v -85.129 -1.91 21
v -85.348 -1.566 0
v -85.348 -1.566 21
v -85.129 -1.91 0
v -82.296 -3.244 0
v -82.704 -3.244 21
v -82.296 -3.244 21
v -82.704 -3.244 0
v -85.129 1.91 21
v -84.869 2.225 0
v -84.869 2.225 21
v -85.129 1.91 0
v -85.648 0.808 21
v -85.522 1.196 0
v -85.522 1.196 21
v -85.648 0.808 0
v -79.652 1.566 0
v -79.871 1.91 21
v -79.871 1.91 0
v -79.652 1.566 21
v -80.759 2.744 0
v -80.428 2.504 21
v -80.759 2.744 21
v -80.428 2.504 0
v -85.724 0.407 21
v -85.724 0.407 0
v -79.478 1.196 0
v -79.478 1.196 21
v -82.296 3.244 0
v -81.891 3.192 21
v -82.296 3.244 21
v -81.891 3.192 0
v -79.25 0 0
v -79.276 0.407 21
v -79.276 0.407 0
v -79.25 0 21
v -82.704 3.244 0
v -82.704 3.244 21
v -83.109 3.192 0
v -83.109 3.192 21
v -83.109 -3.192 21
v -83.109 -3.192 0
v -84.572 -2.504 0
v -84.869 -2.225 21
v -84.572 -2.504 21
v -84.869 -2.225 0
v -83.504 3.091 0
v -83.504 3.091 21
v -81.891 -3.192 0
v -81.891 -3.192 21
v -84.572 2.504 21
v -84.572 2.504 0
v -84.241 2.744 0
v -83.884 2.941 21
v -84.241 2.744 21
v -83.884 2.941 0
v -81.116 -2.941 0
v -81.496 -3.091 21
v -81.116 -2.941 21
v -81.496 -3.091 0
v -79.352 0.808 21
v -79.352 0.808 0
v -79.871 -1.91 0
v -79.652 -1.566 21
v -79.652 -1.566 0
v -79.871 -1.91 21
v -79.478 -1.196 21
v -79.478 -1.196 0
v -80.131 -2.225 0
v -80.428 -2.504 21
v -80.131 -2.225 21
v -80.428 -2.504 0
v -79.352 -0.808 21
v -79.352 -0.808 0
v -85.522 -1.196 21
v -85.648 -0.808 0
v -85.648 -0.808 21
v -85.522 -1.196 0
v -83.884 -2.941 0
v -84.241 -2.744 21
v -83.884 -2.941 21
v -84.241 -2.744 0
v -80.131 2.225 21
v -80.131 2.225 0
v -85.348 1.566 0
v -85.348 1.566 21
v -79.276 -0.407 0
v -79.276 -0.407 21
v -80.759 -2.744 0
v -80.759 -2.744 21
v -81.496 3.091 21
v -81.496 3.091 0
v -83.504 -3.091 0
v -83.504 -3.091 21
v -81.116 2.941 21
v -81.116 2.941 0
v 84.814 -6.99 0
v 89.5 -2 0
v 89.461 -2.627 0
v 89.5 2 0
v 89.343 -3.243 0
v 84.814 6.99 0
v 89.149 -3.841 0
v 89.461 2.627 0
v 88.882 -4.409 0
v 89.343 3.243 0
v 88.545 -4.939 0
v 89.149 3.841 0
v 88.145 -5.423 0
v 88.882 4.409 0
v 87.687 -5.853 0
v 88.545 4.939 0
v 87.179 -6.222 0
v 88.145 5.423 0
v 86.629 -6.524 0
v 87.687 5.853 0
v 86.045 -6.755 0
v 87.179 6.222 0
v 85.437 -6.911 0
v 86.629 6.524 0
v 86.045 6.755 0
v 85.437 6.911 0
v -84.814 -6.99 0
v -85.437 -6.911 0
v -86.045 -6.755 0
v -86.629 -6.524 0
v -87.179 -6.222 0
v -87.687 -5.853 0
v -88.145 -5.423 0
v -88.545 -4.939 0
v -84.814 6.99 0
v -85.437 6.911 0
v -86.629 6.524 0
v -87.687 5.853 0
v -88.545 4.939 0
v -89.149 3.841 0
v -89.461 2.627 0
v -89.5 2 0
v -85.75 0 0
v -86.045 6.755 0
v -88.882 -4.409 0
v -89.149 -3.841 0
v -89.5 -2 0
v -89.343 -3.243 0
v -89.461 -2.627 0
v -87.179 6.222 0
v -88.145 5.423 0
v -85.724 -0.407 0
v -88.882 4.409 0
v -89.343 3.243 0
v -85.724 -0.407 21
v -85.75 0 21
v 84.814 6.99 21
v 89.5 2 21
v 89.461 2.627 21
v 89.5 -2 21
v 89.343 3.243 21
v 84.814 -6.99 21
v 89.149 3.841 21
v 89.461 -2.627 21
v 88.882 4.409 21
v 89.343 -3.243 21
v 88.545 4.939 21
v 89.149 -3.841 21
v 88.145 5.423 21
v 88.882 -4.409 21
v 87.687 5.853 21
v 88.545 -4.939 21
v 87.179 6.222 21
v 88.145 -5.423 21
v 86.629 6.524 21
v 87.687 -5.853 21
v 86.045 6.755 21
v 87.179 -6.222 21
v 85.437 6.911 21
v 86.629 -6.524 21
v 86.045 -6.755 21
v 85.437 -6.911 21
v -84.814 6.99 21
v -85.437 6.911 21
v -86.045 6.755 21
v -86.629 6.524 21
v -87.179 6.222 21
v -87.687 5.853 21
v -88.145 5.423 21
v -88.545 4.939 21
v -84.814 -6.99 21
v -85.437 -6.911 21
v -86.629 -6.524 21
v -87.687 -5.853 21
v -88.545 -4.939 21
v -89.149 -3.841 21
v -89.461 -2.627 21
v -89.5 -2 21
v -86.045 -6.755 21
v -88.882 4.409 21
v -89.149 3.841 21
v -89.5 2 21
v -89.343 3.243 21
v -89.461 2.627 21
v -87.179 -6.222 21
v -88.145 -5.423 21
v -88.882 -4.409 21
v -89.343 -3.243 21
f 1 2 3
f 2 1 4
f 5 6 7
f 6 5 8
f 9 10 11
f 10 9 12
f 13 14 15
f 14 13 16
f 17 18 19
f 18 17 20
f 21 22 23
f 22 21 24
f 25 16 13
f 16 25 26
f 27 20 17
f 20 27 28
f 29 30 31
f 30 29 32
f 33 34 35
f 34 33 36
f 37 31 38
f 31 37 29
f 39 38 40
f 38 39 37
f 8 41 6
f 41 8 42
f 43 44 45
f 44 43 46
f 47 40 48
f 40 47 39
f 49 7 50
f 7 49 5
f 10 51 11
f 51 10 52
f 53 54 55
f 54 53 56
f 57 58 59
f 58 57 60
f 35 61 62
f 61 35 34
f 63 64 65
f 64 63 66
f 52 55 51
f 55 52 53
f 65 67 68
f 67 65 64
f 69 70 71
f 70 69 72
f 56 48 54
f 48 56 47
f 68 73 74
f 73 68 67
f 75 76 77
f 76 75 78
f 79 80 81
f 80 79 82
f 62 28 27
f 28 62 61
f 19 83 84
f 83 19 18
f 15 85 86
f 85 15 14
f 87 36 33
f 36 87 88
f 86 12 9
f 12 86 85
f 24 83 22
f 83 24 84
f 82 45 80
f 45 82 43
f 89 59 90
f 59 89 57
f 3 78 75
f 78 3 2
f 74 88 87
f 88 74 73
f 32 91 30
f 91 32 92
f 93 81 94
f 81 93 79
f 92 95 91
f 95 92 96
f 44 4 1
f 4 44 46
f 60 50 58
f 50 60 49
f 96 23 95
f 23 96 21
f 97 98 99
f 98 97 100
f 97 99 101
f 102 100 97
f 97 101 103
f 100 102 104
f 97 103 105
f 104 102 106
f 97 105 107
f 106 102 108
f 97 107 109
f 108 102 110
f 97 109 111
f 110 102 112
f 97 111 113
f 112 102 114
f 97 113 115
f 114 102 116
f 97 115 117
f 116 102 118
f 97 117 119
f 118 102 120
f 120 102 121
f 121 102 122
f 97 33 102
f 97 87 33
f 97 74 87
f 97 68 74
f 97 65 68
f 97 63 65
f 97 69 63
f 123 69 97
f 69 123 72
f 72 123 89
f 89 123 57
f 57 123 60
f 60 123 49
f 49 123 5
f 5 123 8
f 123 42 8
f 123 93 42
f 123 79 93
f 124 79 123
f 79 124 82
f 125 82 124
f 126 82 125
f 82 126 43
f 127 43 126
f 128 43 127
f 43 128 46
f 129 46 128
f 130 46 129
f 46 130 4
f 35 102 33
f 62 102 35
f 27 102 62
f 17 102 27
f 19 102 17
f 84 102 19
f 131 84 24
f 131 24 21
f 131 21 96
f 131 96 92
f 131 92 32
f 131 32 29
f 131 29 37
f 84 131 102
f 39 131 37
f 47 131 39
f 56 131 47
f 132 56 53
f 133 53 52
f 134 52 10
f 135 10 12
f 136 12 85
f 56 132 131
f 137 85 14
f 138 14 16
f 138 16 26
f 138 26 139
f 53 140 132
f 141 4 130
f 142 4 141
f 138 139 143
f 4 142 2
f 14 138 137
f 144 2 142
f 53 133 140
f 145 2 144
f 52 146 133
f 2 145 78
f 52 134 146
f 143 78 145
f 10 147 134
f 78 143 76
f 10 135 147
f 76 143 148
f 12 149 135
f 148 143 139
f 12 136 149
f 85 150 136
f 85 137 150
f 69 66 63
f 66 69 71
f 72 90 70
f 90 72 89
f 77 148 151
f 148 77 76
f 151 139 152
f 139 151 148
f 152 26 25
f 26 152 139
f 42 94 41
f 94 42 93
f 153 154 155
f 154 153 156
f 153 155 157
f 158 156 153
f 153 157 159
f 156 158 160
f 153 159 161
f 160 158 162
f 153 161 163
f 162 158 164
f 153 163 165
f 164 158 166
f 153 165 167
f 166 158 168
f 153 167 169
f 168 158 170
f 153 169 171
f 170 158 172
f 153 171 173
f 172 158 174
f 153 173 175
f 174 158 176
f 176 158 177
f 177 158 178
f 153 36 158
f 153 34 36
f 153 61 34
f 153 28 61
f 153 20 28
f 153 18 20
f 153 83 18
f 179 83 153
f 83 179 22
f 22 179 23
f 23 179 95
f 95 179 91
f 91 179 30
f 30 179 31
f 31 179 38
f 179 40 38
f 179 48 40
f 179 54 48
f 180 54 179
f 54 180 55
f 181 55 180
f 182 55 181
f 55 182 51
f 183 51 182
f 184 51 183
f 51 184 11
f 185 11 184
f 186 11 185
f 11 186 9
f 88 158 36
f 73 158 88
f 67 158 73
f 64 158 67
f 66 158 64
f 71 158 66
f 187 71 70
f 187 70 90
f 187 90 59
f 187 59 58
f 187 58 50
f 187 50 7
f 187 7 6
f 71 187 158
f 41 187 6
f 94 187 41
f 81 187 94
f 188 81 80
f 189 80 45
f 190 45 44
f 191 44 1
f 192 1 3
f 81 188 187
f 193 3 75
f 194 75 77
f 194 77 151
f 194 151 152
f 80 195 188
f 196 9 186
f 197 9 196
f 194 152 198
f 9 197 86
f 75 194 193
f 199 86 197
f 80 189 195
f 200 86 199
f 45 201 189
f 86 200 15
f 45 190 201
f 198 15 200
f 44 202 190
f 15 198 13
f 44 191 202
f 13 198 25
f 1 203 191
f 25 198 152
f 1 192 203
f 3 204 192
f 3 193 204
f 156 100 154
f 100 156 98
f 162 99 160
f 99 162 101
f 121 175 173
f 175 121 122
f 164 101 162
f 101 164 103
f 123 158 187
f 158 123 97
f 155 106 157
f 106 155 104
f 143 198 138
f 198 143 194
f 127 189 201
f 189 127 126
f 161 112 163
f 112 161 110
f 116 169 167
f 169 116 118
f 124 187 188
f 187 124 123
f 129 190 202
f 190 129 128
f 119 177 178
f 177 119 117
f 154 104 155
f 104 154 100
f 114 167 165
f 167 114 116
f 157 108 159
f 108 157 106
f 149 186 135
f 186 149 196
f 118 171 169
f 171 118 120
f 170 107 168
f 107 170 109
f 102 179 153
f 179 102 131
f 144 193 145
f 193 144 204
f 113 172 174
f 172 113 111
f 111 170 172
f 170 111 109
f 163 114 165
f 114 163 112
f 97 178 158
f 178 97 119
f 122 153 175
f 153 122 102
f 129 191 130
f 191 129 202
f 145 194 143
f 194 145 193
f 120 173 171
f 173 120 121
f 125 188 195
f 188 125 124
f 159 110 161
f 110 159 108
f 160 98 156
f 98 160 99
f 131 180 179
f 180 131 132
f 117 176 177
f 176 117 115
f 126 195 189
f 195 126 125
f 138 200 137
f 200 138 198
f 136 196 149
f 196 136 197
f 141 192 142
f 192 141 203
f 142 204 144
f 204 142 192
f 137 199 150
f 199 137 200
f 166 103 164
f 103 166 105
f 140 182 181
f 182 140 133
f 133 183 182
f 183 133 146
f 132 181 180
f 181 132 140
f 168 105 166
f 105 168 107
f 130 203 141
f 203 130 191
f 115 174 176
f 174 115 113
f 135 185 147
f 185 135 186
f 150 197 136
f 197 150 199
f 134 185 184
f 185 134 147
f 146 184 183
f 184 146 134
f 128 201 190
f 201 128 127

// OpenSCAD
$fn = 50;


difference() {
	union() {
		hull() {
			translate(v = [-84.5000000000, 2.0000000000, 0]) {
				cylinder(h = 21, r = 5);
			}
			translate(v = [84.5000000000, 2.0000000000, 0]) {
				cylinder(h = 21, r = 5);
			}
			translate(v = [-84.5000000000, -2.0000000000, 0]) {
				cylinder(h = 21, r = 5);
			}
			translate(v = [84.5000000000, -2.0000000000, 0]) {
				cylinder(h = 21, r = 5);
			}
		}
	}
	union() {
		translate(v = [-82.5000000000, 0.0000000000, 0]) {
			cylinder(h = 21, r = 3.2500000000);
		}
		translate(v = [-82.5000000000, 0.0000000000, 0]) {
			cylinder(h = 21, r = 1.8000000000);
		}
		translate(v = [-82.5000000000, 0.0000000000, 0]) {
			cylinder(h = 21, r = 1.8000000000);
		}
		translate(v = [-82.5000000000, 0.0000000000, 0]) {
			cylinder(h = 21, r = 1.8000000000);
		}
	}
}
